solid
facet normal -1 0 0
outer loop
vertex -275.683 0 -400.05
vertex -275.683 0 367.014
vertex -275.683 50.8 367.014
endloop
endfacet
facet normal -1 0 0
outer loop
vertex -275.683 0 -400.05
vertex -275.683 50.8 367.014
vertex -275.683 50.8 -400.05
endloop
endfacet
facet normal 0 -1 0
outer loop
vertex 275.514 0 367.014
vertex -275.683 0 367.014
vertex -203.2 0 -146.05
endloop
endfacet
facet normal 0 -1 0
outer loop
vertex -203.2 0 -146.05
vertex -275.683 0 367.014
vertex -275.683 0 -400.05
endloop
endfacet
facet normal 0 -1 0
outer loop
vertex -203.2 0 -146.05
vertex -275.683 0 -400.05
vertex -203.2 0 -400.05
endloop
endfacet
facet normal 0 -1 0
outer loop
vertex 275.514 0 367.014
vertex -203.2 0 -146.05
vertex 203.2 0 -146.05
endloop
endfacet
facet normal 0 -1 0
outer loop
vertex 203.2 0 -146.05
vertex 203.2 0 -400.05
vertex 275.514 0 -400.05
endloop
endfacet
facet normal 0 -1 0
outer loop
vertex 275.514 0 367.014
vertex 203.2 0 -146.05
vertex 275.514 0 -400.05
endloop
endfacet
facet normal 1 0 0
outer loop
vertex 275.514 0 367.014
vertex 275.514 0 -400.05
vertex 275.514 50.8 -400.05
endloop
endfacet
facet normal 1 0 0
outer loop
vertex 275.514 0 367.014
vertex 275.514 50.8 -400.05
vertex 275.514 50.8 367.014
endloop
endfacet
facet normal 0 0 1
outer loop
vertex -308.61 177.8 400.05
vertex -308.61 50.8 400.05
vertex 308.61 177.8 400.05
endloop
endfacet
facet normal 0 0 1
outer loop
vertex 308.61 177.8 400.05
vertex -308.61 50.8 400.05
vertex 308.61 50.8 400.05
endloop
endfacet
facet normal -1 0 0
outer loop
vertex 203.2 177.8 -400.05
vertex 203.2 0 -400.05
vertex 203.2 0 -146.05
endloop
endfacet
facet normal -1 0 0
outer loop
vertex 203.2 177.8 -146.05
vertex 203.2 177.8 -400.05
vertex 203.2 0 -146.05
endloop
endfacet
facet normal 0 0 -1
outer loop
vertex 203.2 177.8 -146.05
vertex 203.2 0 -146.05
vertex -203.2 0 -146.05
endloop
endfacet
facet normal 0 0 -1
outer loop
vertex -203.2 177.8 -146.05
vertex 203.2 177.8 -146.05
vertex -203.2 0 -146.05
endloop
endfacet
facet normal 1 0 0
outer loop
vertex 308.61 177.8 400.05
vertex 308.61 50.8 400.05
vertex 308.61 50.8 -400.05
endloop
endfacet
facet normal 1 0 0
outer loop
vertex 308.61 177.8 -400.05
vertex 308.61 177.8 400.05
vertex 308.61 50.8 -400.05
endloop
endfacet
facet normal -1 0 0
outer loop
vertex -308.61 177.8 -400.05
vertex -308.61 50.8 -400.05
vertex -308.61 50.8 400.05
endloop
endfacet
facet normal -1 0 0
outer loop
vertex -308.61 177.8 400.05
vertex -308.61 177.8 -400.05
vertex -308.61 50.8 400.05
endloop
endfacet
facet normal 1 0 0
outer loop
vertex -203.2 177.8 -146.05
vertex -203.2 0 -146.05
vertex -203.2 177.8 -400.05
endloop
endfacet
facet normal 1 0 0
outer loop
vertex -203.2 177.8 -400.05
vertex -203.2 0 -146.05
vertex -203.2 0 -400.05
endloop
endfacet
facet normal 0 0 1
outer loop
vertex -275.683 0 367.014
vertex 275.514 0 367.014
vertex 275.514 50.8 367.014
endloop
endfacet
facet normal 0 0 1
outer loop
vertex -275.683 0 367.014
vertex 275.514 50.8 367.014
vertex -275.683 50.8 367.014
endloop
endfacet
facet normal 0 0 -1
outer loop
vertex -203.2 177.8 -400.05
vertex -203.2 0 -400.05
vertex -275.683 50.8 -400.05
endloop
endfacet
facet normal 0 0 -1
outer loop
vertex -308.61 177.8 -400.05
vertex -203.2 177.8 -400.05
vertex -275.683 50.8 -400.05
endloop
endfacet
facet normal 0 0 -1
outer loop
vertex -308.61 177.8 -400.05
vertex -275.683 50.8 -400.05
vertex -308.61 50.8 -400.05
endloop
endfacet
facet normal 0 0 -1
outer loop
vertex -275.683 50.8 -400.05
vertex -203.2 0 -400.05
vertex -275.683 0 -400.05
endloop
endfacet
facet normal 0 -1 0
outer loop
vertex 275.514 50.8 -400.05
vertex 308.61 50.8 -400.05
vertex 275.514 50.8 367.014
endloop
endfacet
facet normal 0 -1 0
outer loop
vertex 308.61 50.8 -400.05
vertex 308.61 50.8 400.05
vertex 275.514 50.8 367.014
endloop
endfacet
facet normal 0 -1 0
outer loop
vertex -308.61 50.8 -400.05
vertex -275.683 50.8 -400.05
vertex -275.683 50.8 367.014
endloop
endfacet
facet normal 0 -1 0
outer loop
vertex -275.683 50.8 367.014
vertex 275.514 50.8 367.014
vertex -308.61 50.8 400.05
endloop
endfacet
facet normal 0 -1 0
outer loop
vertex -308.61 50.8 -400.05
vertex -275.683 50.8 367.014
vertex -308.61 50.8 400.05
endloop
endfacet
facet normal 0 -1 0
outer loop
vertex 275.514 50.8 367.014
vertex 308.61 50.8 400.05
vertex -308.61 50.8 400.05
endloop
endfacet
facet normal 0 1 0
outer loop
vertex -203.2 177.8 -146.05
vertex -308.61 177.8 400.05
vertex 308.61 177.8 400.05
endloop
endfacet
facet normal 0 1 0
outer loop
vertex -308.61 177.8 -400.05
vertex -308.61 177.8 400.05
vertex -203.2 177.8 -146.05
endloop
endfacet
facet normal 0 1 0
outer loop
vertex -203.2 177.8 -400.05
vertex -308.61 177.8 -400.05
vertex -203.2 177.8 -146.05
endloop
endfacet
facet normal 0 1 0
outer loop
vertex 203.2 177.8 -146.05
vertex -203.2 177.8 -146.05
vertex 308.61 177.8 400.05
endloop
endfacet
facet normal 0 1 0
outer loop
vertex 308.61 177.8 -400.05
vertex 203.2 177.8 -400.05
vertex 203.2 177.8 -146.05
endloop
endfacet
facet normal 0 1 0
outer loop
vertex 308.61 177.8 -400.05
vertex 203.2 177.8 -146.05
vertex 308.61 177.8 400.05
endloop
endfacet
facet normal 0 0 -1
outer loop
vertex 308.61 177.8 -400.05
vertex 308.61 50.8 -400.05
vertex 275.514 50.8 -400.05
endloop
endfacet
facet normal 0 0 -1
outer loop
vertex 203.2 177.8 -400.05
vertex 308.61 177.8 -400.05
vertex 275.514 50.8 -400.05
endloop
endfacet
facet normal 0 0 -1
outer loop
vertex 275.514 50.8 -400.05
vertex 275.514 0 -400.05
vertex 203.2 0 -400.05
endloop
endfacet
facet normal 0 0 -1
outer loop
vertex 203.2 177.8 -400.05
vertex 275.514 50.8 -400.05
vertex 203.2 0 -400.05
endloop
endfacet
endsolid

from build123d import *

# Parameters (mm, degrees)
BOSS_EXTRUDE1_DEPTH = 177.8
CUT_EXTRUDE1_DEPTH  = 50.8


with BuildPart() as part:
    # Sketch1 → Boss-Extrude1 (new body)
    with BuildSketch(Plane(origin=(0, 0, 0), x_dir=(1, 0, 0), z_dir=(0, 1, 0))):
        Polygon((308.61, 400.05), (203.2, 400.05), (203.2, 146.05), (-203.2, 146.05), (-203.2, 400.05), (-308.61, 400.05), (-308.61, -400.05), (308.61, -400.05), align=None)
    extrude(amount=BOSS_EXTRUDE1_DEPTH)

    # Sketch2 → Cut-Extrude1 (cut)
    with BuildSketch(Plane.XZ):
        Polygon((308.61, -400.05), (275.513805506, -400.05), (275.513805506, 367.013597839), (-275.682759314, 367.013597839), (-275.682759314, -400.05), (-308.61, -400.05), (-308.61, 400.05), (-275.682759314, 400.05), (275.513805506, 400.05), (308.61, 400.05), align=None)
    extrude(amount=-CUT_EXTRUDE1_DEPTH, mode=Mode.SUBTRACT)


solid = part.part
